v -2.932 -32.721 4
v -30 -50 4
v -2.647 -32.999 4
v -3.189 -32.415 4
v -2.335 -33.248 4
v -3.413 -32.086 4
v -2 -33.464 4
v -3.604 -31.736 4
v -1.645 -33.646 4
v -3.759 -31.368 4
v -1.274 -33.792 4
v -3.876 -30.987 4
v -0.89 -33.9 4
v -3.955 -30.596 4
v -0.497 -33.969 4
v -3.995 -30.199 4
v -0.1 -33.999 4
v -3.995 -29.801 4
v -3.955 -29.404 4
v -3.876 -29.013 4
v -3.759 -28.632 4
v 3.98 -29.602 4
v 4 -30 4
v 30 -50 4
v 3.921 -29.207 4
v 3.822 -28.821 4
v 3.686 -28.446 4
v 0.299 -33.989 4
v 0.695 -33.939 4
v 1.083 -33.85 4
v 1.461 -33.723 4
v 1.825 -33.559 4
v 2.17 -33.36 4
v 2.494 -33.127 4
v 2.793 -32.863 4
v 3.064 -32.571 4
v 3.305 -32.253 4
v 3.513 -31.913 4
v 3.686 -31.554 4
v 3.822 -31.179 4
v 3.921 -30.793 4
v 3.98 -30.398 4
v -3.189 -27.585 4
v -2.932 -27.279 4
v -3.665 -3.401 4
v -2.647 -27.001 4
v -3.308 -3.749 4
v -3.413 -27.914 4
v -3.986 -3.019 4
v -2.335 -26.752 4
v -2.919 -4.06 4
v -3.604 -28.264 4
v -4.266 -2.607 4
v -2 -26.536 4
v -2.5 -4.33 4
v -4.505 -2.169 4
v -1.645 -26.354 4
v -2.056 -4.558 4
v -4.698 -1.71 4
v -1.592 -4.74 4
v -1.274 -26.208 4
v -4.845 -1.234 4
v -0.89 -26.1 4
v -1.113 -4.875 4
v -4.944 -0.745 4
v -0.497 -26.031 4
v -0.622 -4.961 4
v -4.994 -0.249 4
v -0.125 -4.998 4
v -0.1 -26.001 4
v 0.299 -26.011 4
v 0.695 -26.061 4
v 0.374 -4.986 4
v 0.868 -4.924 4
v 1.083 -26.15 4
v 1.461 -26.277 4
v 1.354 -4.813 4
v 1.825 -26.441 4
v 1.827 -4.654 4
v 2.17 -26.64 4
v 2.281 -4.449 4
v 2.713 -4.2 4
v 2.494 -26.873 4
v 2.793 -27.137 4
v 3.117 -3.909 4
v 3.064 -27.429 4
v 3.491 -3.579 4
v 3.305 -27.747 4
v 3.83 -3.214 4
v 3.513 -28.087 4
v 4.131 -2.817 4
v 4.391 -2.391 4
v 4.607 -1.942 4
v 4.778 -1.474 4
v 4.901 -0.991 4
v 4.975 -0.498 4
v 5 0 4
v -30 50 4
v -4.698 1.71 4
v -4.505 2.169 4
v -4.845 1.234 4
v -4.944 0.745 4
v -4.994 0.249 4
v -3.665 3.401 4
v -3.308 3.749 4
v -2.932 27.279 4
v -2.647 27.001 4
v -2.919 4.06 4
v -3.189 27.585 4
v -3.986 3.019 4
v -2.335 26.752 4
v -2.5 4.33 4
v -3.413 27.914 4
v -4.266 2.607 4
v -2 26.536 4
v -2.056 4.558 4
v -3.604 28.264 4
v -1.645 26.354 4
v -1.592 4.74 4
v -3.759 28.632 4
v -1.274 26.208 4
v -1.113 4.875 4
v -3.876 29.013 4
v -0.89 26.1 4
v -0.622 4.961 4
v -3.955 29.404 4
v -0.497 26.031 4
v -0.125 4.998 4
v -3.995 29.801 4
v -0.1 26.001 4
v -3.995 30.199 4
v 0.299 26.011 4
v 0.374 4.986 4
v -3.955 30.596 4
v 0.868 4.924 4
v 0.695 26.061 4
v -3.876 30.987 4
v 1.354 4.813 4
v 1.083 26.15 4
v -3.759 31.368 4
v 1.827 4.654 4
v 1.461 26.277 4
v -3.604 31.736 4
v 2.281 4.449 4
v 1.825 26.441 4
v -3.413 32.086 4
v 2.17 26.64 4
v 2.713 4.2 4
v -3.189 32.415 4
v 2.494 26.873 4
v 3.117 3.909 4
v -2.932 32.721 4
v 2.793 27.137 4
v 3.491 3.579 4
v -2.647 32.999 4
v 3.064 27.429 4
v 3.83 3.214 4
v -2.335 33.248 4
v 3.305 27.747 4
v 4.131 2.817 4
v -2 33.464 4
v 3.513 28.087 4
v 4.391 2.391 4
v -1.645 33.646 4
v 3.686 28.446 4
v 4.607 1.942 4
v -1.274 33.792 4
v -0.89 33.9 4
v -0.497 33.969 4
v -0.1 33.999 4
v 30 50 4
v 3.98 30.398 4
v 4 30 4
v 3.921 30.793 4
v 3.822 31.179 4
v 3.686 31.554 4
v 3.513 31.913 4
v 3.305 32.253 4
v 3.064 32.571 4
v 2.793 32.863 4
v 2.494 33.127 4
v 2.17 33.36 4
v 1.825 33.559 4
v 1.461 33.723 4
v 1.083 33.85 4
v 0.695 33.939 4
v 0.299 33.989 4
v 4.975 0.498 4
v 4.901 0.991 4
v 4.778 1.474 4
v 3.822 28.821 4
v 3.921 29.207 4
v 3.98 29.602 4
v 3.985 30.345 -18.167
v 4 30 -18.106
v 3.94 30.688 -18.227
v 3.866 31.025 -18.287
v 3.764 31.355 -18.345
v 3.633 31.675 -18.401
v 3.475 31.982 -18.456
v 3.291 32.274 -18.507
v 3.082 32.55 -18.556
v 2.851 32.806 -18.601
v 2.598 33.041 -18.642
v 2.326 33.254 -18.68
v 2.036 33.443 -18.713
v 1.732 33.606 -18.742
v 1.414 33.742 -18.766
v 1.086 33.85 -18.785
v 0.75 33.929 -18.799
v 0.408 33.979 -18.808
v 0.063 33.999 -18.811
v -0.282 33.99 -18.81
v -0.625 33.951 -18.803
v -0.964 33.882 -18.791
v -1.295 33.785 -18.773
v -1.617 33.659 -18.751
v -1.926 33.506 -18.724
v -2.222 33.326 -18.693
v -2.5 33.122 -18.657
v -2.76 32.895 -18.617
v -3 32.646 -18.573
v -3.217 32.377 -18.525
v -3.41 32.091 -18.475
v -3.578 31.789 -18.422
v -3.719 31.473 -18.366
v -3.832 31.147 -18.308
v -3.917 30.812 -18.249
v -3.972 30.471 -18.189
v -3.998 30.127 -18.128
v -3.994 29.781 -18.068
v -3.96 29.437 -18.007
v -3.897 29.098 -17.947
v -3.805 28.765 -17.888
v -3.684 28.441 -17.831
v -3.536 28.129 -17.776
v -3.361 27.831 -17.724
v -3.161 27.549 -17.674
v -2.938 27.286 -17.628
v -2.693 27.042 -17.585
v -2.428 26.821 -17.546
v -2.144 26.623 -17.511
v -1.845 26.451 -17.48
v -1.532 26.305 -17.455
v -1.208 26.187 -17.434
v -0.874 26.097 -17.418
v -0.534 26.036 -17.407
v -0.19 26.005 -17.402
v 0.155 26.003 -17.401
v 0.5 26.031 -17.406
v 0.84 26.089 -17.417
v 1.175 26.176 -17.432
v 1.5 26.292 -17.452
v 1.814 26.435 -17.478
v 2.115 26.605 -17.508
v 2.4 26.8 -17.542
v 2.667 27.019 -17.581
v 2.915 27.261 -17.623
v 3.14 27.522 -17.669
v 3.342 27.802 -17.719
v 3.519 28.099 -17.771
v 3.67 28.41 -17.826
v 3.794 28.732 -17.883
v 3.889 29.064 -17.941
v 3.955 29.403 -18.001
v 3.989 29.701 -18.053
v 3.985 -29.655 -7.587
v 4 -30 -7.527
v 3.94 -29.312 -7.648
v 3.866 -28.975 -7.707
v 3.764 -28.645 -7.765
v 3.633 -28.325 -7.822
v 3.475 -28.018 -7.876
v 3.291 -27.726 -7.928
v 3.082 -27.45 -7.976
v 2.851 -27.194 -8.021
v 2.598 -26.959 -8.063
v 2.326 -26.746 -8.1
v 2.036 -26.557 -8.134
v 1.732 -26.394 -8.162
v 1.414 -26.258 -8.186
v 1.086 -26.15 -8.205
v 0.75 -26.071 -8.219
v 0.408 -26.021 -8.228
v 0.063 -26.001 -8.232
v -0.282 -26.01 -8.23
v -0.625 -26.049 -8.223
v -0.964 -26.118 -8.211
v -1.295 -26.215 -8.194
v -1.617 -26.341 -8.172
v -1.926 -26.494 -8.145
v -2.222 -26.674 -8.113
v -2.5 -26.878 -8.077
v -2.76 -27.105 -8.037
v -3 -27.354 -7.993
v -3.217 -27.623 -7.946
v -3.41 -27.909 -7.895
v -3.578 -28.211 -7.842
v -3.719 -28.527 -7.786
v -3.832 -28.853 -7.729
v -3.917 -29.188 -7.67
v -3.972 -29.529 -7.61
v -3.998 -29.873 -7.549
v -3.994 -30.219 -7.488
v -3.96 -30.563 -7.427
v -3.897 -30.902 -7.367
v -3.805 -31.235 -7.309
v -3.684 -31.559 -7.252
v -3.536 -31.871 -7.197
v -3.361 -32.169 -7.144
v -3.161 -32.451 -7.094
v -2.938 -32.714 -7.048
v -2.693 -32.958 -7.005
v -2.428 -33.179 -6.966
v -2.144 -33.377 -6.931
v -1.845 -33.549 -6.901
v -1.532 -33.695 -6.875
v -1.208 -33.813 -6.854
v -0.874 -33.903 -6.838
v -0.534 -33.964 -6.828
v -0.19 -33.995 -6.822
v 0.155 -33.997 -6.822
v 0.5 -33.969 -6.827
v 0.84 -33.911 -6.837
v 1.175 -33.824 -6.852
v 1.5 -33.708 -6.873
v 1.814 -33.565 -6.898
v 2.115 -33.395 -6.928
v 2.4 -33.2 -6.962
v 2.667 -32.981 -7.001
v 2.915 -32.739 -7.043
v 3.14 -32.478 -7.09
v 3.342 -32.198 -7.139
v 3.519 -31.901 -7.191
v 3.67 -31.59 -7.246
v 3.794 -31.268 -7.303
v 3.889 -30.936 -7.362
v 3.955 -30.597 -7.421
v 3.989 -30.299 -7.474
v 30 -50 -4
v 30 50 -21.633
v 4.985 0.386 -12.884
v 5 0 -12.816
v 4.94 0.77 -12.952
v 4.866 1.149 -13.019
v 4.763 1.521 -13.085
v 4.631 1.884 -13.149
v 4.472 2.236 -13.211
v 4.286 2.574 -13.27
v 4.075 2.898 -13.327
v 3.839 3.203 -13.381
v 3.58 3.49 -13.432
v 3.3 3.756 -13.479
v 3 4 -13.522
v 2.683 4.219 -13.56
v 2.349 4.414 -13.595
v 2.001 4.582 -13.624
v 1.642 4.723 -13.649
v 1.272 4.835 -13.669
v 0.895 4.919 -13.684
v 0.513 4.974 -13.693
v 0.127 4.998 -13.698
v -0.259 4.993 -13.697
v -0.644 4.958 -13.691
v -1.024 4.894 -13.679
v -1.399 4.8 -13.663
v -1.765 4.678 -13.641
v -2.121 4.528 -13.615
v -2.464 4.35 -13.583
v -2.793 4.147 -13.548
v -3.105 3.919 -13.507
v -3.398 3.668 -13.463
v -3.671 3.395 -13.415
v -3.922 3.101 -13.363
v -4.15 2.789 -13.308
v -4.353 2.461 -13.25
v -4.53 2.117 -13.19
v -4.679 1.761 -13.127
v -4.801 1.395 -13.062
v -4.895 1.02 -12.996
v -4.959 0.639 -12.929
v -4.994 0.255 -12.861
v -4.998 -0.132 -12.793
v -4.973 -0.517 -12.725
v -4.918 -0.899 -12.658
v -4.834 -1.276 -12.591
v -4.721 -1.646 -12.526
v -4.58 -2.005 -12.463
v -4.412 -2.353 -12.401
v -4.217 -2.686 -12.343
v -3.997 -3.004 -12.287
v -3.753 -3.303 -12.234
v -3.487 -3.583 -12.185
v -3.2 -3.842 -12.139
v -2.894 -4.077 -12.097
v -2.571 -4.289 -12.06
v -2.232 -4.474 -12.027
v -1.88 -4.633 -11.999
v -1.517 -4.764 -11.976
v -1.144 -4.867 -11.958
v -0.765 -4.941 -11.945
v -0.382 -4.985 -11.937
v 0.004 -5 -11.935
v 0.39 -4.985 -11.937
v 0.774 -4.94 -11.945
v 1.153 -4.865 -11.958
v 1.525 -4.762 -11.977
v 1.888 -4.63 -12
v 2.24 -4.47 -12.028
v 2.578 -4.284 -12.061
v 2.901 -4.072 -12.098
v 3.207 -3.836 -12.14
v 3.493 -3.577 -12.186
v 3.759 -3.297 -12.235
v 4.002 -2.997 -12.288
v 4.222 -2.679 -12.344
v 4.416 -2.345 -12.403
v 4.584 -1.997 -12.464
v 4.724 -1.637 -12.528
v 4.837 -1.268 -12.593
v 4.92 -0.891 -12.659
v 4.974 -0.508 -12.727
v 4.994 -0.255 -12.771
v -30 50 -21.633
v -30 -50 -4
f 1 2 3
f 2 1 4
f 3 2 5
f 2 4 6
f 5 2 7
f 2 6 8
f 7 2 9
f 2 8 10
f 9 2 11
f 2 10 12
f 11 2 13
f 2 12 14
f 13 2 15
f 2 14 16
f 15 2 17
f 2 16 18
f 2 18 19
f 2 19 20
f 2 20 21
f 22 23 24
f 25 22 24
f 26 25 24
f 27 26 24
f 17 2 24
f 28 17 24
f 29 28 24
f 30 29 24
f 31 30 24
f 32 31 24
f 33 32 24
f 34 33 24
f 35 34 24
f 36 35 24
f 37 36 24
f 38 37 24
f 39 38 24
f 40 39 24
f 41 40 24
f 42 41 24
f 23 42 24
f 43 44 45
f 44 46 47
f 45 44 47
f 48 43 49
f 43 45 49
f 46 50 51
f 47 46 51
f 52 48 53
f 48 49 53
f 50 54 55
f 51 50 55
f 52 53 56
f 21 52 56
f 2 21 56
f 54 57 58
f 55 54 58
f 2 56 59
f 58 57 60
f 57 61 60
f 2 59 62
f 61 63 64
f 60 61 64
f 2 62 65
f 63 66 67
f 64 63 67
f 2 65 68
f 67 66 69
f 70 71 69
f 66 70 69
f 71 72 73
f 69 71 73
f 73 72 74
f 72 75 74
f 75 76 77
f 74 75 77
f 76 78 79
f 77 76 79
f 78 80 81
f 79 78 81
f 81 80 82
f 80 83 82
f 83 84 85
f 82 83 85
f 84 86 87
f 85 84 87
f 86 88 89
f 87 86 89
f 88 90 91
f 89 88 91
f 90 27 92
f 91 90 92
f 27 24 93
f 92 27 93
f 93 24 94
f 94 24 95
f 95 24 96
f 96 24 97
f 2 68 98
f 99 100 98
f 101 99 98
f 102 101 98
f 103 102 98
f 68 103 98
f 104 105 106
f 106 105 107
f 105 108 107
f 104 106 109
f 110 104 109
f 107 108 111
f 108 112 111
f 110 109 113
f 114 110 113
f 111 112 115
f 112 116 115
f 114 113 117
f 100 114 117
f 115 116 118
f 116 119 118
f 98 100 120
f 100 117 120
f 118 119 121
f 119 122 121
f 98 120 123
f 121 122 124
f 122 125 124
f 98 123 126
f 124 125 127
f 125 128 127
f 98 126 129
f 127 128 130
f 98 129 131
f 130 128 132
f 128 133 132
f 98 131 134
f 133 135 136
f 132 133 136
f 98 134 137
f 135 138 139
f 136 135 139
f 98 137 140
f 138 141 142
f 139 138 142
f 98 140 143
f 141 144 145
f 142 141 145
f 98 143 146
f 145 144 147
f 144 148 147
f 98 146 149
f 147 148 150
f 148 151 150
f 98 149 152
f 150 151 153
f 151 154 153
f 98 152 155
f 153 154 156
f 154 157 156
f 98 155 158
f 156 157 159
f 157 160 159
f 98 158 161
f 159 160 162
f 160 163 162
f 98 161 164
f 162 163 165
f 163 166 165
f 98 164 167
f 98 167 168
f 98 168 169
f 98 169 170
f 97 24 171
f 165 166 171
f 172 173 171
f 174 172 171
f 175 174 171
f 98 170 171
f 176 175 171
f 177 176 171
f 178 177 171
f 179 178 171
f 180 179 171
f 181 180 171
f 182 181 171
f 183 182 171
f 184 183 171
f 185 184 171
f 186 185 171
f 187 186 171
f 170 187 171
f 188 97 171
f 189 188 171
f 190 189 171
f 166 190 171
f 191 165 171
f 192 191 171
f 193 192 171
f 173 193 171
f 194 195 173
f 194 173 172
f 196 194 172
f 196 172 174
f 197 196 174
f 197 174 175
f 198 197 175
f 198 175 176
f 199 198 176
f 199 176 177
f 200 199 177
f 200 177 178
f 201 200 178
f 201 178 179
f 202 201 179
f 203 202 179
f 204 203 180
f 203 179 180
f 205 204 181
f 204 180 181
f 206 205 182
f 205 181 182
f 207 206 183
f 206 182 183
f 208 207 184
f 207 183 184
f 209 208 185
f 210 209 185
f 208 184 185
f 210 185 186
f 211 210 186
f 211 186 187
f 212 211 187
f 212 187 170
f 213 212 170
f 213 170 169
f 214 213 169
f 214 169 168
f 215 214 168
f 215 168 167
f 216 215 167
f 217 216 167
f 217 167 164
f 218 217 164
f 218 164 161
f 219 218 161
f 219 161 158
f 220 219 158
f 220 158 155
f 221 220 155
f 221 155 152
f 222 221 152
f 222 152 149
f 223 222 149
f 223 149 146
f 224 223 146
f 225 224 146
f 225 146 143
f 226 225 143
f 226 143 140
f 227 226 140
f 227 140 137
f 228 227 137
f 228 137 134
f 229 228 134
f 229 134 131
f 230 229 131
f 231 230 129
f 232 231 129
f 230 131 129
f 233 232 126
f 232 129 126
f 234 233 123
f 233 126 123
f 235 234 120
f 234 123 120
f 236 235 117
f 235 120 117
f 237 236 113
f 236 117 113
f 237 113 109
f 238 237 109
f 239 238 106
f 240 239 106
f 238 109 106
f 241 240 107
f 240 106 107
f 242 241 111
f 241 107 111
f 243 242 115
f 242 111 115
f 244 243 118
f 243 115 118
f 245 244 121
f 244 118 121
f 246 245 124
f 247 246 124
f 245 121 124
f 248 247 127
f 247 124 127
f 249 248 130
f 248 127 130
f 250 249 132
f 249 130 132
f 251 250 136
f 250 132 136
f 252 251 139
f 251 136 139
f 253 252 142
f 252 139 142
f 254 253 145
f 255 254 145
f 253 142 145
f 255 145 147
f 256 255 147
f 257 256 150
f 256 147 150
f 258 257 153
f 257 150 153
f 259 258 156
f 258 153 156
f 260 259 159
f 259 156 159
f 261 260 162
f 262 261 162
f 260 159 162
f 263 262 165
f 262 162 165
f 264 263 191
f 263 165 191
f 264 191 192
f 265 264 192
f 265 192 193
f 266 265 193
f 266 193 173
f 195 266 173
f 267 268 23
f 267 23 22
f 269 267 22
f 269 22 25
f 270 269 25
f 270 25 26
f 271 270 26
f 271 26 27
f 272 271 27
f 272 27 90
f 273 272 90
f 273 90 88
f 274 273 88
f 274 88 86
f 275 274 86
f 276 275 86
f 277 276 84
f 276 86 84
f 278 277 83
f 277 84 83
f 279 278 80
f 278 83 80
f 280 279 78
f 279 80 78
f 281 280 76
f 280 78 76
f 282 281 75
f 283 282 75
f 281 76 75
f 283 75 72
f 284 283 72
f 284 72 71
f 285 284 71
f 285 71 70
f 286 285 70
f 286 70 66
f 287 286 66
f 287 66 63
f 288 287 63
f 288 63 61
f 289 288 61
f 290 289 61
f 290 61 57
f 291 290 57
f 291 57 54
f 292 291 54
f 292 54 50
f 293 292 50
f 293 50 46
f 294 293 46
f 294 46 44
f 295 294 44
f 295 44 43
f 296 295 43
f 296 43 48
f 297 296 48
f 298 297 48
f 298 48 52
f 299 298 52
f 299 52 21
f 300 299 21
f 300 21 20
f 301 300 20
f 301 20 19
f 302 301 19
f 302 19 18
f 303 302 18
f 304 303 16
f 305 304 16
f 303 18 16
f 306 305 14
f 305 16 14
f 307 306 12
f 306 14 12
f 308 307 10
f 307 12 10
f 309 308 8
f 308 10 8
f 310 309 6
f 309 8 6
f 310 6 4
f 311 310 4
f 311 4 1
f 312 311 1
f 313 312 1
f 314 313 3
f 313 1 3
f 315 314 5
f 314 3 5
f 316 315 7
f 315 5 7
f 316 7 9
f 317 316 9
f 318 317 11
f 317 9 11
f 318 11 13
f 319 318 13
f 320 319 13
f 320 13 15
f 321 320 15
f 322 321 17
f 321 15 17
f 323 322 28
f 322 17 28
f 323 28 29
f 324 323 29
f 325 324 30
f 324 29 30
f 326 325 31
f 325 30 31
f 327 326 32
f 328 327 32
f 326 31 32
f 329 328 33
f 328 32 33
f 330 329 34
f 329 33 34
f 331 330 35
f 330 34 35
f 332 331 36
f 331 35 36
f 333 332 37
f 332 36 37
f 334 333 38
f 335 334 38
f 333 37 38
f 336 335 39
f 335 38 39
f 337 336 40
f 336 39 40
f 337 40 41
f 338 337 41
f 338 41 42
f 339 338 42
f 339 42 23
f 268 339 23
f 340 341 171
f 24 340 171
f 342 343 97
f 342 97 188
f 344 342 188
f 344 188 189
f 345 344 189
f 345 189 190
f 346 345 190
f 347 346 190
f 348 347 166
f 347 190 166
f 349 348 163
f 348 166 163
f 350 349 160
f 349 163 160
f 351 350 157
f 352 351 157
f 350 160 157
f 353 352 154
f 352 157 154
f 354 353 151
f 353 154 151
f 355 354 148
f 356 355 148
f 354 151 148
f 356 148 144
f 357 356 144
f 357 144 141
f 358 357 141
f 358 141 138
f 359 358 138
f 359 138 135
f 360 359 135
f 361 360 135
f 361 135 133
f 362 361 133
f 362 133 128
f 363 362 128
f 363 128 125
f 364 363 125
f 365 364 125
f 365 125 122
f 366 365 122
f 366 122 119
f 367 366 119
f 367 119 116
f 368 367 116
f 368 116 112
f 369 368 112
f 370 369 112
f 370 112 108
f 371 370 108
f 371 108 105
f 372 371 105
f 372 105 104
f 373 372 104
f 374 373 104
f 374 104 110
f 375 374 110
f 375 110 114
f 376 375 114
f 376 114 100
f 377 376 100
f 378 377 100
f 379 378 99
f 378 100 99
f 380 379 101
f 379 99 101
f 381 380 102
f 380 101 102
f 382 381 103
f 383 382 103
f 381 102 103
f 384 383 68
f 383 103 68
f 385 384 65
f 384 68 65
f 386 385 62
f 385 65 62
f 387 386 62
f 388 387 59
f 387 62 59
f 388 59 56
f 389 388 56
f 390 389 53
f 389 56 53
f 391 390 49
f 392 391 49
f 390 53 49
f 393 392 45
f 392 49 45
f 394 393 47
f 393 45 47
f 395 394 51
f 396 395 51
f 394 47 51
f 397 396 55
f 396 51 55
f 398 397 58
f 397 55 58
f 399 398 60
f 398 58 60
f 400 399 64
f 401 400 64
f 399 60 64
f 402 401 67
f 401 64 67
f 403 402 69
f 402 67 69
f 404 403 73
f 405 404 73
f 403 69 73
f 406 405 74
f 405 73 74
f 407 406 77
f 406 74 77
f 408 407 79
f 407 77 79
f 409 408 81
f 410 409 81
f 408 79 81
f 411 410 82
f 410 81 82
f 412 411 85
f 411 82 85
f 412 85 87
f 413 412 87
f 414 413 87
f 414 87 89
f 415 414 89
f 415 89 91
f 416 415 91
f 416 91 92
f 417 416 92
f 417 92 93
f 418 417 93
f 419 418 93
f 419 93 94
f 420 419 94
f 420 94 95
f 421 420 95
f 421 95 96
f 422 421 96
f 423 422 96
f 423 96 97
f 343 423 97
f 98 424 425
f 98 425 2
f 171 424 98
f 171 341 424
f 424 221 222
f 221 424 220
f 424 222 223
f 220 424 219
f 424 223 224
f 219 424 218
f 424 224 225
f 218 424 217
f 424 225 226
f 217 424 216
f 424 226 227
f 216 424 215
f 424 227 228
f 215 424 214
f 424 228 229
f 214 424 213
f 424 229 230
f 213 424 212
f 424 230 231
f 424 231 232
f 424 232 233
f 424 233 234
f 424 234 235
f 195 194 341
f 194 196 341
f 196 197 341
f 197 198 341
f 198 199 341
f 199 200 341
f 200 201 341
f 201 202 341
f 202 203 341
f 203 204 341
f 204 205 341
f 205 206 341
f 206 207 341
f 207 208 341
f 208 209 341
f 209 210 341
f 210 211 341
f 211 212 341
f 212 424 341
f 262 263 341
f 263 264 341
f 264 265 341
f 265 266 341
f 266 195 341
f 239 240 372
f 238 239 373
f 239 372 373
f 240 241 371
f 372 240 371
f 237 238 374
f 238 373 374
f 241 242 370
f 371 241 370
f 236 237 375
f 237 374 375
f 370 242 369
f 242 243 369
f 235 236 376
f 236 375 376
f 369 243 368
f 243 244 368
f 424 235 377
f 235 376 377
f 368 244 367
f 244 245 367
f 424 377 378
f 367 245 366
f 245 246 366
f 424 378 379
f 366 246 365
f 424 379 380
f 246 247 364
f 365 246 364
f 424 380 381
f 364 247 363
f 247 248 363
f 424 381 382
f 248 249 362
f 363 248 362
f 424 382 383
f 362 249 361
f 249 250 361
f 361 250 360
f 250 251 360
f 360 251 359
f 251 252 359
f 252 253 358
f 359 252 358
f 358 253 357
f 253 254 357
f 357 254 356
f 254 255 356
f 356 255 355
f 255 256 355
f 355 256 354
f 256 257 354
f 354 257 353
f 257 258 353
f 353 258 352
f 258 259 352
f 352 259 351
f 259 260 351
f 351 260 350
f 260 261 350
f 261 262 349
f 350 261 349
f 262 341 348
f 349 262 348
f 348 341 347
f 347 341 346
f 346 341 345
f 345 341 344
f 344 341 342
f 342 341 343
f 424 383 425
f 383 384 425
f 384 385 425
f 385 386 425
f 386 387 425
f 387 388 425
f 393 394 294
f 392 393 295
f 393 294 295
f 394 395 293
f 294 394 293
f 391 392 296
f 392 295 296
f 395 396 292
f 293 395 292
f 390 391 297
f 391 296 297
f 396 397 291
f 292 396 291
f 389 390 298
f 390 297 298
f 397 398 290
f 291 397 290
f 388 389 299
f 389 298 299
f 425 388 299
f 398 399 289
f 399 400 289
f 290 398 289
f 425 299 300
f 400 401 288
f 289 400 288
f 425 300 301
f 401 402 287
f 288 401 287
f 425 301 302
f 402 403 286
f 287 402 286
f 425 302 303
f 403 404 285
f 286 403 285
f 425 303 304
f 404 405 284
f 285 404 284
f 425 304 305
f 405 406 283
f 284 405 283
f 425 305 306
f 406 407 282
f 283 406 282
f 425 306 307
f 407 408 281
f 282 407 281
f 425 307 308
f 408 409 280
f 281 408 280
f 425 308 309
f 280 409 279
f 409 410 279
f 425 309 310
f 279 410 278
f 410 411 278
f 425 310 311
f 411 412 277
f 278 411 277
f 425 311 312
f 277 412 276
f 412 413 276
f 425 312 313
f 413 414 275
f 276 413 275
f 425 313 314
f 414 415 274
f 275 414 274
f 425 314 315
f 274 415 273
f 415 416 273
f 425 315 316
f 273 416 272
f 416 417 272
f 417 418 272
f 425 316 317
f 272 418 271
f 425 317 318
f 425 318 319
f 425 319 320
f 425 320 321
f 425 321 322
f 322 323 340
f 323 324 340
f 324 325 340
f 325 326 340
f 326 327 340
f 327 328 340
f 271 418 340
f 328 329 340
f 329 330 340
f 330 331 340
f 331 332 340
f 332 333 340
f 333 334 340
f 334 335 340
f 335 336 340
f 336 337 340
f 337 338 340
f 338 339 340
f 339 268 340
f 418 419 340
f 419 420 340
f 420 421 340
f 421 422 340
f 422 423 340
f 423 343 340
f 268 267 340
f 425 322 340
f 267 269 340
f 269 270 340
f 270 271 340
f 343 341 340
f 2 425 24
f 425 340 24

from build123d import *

# Parameters (mm, degrees)
BOSS_EXTRUDE1_DEPTH = 30
SKETCH3_R           = 4
SKETCH3_R_2         = 5
CUT_EXTRUDE1_DEPTH  = 60


with BuildPart() as part:
    # Sketch2 → Boss-Extrude1 (new, symmetric)
    with BuildSketch(Plane(origin=(0, 0, 0), x_dir=(0, 0, -1), z_dir=(1, 0, 0))):
        Polygon((4, 50), (21.632698071, 50), (4, -50), (-4, -50), (-4, 50), align=None)
    extrude(amount=BOSS_EXTRUDE1_DEPTH, both=True)

    # Sketch3 → Cut-Extrude1 (cut)
    with BuildSketch(Plane.XY.offset(4)):
        with Locations((0, -30)):
            Circle(SKETCH3_R)
        with Locations((0, 30)):
            Circle(SKETCH3_R)
        Circle(SKETCH3_R_2)
    extrude(amount=-CUT_EXTRUDE1_DEPTH, mode=Mode.SUBTRACT)


solid = part.part
